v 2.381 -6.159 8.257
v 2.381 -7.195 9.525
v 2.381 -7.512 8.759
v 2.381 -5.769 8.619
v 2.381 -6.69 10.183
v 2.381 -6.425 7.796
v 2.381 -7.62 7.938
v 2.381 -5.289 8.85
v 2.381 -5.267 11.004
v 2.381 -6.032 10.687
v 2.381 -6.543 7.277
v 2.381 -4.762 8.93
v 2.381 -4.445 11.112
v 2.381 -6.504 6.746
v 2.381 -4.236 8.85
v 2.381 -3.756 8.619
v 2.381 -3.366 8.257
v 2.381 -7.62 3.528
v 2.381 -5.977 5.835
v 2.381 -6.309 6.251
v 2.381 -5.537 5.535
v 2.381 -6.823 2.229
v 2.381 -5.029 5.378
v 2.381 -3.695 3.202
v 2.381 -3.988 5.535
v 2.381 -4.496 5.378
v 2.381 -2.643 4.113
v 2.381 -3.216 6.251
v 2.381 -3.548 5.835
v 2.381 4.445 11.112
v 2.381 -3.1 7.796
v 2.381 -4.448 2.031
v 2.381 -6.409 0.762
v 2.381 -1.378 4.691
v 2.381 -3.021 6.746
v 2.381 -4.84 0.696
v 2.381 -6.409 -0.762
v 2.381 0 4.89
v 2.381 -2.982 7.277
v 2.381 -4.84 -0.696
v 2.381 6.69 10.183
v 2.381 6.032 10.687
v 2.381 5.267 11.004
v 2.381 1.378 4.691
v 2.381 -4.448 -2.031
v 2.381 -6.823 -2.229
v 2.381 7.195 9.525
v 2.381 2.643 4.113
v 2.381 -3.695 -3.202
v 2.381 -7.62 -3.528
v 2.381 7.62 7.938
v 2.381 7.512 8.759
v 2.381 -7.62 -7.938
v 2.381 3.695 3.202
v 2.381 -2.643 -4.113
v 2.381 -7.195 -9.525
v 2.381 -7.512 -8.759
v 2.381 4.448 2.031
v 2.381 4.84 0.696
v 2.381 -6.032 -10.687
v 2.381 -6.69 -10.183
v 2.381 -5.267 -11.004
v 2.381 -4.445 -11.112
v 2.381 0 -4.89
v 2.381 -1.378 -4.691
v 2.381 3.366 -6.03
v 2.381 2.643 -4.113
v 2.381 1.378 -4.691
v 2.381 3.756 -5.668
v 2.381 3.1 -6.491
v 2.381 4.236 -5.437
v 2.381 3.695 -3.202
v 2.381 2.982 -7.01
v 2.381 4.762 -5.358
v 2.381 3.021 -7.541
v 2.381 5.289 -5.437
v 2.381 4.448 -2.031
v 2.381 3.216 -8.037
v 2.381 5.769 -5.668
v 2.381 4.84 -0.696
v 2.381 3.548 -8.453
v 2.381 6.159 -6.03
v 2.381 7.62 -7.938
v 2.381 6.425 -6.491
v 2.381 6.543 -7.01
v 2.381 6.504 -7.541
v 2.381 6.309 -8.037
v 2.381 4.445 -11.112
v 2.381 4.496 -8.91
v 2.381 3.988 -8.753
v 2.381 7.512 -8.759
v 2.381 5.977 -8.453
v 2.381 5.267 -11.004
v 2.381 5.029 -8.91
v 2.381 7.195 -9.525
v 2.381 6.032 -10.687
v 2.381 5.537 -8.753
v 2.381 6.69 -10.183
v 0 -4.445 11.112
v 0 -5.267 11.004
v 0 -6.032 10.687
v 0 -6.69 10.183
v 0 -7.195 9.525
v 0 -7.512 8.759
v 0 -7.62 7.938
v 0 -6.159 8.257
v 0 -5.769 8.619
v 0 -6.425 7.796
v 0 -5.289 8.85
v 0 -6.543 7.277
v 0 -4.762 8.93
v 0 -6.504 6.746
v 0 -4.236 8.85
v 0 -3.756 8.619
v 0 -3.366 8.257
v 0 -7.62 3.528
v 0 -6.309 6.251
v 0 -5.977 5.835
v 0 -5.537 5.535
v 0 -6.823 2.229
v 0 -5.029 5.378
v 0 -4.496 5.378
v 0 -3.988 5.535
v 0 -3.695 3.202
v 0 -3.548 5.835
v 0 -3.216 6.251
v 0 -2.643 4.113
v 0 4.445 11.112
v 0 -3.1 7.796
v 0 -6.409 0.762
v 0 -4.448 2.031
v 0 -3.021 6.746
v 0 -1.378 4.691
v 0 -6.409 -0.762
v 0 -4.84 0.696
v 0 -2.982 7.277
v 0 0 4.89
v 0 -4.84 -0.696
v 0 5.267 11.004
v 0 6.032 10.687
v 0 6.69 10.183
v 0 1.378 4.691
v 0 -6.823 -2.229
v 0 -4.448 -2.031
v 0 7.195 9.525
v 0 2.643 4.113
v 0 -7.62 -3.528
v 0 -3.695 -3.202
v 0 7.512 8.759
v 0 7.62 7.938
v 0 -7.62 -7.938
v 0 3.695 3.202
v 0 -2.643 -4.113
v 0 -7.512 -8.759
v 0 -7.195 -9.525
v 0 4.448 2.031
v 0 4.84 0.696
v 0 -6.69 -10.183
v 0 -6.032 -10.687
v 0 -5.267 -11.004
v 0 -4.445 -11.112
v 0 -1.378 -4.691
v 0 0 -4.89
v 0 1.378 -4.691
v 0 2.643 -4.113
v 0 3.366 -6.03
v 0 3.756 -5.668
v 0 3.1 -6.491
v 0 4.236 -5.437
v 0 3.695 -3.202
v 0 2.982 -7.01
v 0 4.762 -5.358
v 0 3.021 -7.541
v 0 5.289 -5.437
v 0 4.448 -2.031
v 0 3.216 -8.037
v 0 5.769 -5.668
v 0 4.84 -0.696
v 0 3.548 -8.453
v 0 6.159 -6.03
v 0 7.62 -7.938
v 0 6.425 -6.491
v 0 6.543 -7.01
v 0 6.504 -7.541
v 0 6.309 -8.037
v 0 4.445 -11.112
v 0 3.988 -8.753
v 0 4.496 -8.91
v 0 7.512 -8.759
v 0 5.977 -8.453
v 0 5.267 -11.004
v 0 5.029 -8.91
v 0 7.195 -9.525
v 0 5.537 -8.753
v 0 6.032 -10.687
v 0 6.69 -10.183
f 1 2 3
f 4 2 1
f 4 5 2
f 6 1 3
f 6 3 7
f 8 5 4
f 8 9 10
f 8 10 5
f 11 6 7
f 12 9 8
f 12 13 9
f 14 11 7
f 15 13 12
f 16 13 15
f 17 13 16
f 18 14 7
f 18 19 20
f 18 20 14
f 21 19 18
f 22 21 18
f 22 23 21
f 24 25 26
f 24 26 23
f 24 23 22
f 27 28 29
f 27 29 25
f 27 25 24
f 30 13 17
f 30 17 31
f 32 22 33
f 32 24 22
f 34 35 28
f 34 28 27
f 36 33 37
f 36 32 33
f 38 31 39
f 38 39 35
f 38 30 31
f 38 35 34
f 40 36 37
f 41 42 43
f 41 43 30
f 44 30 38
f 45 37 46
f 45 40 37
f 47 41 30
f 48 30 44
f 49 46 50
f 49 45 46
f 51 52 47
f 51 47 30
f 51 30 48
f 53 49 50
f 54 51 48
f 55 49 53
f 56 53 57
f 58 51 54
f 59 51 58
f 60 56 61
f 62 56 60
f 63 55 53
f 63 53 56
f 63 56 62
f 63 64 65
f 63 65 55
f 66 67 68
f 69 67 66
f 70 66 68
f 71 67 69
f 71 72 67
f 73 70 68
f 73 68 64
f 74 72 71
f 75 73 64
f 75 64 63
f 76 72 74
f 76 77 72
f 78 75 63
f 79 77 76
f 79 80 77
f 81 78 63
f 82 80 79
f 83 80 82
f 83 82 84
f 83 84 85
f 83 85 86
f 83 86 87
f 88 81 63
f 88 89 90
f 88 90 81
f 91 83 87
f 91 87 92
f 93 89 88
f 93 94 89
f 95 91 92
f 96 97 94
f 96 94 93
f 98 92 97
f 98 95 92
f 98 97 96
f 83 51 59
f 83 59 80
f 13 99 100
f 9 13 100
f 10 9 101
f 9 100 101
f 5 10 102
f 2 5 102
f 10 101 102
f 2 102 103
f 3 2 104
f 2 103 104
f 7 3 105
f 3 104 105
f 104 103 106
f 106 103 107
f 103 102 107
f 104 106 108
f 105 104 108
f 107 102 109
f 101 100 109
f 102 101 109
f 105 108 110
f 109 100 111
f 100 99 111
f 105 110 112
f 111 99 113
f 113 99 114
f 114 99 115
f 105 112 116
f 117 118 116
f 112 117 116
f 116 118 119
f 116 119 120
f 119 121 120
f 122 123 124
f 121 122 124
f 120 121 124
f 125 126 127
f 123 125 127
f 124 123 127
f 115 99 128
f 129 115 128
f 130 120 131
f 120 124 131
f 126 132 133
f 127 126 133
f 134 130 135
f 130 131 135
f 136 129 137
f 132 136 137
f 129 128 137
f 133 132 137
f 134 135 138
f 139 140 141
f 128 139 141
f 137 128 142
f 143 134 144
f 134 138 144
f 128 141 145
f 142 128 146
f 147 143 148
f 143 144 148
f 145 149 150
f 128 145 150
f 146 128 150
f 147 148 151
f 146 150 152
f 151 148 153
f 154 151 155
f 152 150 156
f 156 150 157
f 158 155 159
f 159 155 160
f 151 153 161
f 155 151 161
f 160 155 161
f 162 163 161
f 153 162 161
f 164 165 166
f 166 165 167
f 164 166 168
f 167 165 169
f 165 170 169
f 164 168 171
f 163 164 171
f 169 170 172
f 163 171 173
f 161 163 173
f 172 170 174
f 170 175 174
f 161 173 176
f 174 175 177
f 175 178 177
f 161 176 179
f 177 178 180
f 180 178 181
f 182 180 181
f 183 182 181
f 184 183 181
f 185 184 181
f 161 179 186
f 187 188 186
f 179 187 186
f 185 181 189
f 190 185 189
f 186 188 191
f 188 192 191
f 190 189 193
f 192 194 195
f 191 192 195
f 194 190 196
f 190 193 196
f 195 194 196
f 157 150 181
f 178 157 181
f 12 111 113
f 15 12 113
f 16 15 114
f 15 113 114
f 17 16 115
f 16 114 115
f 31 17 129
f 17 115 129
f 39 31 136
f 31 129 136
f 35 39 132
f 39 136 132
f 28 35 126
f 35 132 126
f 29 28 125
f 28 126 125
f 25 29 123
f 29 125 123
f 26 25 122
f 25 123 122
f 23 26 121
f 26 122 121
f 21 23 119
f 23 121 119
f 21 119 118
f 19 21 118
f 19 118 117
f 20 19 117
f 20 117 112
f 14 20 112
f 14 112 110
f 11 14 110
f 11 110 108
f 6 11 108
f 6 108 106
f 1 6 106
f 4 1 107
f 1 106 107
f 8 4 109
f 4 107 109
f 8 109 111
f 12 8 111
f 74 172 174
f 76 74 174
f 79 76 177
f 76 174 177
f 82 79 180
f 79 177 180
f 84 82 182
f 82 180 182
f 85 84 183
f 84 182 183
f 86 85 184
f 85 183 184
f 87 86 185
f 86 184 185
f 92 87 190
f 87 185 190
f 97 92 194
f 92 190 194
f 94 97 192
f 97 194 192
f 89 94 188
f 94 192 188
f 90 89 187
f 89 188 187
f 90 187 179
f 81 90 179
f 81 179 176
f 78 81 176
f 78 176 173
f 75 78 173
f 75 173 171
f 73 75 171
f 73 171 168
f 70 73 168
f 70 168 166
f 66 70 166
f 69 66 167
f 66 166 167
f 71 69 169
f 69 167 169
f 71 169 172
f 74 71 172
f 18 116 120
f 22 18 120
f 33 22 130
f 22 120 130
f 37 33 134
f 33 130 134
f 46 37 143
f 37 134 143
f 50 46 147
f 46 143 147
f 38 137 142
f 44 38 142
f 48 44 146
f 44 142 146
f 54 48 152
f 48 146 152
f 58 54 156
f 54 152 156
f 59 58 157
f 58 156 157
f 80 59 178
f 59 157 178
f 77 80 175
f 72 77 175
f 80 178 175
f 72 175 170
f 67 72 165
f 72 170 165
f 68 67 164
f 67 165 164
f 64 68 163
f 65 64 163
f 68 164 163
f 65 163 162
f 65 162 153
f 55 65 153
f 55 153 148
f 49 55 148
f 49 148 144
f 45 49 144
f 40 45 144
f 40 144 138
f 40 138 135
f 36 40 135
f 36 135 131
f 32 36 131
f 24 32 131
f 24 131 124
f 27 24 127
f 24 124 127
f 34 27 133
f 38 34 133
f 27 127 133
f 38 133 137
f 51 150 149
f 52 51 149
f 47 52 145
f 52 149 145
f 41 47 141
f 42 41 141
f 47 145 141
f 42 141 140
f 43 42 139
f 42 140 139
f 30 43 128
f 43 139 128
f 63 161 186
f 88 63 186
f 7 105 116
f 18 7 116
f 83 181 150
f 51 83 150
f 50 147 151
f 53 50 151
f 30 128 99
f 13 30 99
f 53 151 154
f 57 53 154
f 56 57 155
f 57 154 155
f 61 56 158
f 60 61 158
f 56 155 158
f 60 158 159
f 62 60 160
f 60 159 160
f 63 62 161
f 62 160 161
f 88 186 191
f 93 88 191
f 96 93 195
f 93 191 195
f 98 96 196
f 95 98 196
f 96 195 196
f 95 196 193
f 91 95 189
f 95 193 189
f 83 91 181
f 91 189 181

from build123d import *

# Parameters (mm, degrees)
SKETCH2_R      = 4.8895
SKETCH2_R_2    = 1.7859375
EXTRUDE1_DEPTH = 2.38125


with BuildPart() as part:
    # Sketch2 → Extrude1 (new body)
    with BuildSketch(Plane.ZY):
        with BuildLine():
            Line((7.9375, -7.62), (3.527817924, -7.62))
            ThreePointArc((3.527817924, -7.62), (0, -6.35635), (-3.527817924, -7.62))
            Line((-3.527817924, -7.62), (-7.9375, -7.62))
            ThreePointArc((-7.9375, -7.62), (-10.18256403, -6.69006403), (-11.1125, -4.445))
            Line((-11.1125, -4.445), (-11.1125, 4.445))
            ThreePointArc((-11.1125, 4.445), (-10.18256403, 6.69006403), (-7.9375, 7.62))
            Line((-7.9375, 7.62), (7.9375, 7.62))
            ThreePointArc((7.9375, 7.62), (10.18256403, 6.69006403), (11.1125, 4.445))
            Line((11.1125, 4.445), (11.1125, -4.445))
            ThreePointArc((11.1125, -4.445), (10.18256403, -6.69006403), (7.9375, -7.62))
        make_face()
        Circle(SKETCH2_R, mode=Mode.SUBTRACT)
        with Locations((-7.14375, 4.7625)):
            Circle(SKETCH2_R_2, mode=Mode.SUBTRACT)
        with Locations((7.14375, -4.7625)):
            Circle(SKETCH2_R_2, mode=Mode.SUBTRACT)
    extrude(amount=-EXTRUDE1_DEPTH)


solid = part.part
